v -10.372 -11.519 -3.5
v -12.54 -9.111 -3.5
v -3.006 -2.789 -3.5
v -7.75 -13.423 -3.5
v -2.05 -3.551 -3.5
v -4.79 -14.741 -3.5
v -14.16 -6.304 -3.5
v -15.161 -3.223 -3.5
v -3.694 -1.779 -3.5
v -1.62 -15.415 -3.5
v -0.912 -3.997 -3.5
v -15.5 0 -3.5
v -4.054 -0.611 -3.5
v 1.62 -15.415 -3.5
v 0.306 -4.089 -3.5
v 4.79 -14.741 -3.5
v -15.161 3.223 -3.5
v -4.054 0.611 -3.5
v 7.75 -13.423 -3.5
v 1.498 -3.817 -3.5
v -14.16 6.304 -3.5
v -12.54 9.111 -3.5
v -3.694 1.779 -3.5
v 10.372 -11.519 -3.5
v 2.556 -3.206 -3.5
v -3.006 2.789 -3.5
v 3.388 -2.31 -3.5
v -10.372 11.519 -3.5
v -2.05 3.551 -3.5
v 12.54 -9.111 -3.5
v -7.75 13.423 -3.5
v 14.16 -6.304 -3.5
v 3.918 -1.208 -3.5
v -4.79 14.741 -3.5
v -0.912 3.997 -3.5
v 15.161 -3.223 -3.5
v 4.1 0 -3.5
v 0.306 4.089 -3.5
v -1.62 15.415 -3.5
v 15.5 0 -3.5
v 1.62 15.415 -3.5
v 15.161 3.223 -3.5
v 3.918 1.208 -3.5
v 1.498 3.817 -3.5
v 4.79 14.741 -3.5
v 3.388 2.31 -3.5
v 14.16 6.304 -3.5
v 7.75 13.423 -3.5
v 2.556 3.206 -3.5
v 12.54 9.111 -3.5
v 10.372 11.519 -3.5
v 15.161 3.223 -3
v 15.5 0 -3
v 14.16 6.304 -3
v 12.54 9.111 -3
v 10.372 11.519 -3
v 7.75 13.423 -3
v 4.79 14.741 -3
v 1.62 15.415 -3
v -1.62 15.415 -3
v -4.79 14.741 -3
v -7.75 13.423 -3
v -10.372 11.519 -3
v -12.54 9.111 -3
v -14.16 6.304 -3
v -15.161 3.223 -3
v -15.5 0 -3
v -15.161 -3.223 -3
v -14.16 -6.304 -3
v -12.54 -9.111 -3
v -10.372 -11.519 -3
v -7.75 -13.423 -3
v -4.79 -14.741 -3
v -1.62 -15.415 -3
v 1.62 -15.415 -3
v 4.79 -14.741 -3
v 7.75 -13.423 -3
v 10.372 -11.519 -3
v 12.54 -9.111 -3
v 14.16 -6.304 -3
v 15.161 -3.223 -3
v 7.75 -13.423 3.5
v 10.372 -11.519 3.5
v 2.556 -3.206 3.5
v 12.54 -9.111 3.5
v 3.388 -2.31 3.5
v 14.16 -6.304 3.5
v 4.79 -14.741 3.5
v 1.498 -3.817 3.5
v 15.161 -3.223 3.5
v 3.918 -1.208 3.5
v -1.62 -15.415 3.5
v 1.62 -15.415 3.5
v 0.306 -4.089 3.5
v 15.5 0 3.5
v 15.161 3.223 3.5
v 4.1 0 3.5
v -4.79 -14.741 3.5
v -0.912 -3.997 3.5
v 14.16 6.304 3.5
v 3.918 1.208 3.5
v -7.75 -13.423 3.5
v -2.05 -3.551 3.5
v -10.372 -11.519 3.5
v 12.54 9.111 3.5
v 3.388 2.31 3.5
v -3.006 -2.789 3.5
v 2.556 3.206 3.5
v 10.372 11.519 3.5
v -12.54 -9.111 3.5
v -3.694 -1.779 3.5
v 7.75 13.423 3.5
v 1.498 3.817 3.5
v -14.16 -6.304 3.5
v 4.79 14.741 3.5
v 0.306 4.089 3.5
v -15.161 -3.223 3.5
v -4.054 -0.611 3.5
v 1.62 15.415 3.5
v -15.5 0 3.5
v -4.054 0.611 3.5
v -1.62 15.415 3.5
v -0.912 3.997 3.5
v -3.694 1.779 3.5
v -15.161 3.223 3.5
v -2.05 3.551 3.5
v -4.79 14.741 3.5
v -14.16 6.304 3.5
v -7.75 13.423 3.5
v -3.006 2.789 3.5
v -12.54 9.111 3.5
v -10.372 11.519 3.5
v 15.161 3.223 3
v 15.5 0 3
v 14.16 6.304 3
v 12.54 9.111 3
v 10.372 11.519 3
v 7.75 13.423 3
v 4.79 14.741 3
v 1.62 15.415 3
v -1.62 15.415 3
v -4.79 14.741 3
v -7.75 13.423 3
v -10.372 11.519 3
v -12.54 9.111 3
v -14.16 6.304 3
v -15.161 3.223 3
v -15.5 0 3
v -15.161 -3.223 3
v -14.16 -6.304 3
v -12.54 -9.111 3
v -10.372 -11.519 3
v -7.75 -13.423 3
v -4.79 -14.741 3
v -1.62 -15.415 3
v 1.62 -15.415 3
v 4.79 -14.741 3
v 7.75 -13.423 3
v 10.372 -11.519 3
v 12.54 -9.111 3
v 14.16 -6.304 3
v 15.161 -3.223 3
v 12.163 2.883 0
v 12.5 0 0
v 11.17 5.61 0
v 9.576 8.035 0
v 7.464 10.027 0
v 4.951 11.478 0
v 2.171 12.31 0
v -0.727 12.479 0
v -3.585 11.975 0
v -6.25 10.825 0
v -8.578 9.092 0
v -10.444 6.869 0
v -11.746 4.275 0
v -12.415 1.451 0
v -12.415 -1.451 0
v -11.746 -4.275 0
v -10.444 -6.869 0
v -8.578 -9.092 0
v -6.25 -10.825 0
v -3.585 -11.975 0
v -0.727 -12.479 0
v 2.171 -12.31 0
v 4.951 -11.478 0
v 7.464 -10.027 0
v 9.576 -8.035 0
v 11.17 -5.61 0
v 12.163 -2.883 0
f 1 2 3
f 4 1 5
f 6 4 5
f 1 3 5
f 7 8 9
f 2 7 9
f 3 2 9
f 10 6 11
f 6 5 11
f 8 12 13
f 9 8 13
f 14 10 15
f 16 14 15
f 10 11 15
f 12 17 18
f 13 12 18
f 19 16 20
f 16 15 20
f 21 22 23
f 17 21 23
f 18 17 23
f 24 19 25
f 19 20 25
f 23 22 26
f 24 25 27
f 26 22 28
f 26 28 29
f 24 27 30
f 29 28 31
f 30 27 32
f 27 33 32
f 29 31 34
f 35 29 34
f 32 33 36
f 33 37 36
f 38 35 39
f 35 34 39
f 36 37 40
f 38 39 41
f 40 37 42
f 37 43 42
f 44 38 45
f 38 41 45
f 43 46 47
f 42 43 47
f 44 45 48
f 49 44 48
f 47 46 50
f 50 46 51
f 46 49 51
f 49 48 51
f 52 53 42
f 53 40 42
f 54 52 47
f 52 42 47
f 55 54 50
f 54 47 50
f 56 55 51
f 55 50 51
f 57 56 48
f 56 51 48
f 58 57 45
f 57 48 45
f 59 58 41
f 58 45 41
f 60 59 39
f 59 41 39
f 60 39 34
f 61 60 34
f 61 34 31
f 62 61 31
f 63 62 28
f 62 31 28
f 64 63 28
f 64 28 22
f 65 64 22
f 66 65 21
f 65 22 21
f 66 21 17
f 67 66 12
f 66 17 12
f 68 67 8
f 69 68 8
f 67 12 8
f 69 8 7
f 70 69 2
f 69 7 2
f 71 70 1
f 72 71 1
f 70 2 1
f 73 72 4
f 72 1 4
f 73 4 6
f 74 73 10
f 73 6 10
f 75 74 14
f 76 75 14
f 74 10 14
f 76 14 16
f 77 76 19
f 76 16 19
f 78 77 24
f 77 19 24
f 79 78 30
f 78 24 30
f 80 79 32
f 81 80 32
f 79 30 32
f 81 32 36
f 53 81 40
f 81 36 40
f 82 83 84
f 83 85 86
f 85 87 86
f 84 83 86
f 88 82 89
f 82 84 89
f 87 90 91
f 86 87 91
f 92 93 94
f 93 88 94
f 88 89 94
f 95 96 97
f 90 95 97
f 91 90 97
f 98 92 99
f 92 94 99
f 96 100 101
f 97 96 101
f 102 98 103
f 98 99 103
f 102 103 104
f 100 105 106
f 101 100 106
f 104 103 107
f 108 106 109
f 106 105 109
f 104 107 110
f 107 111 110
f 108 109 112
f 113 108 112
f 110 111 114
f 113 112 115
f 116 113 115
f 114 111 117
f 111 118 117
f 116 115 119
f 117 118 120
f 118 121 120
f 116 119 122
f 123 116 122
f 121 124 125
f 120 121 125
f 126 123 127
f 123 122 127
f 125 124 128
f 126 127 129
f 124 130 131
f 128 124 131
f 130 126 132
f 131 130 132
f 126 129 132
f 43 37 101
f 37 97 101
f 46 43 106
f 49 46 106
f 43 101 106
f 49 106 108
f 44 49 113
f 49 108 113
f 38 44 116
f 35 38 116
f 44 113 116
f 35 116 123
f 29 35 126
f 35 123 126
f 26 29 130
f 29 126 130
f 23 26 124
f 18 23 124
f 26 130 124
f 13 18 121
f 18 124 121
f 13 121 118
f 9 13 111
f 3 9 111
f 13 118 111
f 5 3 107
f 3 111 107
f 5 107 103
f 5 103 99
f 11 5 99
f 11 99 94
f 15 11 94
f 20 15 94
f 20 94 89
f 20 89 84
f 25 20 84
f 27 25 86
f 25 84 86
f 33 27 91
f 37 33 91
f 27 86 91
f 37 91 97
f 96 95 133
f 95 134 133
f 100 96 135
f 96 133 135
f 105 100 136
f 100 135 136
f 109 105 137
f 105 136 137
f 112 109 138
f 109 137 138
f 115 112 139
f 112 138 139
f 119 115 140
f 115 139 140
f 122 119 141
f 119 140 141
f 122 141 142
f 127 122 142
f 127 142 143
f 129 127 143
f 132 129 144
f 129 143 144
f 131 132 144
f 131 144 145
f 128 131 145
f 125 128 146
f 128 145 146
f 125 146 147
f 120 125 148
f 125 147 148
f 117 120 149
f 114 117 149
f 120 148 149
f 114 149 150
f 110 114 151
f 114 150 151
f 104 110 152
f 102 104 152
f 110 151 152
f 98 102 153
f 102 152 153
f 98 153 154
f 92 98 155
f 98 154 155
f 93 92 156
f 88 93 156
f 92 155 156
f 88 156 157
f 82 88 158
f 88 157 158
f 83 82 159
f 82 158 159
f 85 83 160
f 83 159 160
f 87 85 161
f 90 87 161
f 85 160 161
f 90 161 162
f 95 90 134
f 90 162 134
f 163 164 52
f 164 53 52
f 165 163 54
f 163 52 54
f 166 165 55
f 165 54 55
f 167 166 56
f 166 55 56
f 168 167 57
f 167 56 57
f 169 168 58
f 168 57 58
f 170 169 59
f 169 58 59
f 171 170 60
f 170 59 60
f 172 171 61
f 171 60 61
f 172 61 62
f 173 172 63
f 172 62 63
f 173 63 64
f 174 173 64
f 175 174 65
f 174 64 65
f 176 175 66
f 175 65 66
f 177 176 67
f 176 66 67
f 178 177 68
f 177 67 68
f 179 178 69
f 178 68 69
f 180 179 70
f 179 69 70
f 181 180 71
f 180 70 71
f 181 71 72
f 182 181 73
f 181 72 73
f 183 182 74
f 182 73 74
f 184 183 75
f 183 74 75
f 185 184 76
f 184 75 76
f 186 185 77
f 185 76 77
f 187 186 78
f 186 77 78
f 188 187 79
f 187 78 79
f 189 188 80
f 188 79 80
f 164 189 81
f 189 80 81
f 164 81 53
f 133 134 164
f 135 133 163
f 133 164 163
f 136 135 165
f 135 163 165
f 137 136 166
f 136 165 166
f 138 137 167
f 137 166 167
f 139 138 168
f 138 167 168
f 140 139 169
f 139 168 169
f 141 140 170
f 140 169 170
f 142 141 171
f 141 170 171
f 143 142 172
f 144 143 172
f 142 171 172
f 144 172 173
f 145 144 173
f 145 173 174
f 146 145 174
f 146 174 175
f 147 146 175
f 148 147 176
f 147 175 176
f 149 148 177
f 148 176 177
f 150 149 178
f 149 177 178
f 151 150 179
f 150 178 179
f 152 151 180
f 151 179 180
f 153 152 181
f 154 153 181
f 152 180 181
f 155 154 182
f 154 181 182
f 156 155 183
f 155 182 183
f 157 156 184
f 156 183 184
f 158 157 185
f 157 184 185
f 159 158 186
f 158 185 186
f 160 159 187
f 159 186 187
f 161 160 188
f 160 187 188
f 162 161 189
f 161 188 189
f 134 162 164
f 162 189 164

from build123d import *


with BuildPart() as part:
    # Sketch → Revolution (revolve)
    with BuildSketch(Plane.XZ):
        Polygon((4.1, 3.5), (15.5, 3.5), (15.5, 3), (12.5, 0), (15.5, -3), (15.5, -3.5), (4.1, -3.5), align=None)
    revolve(axis=Axis((0, 0, 0), (0, 0, 1)))


solid = part.part
